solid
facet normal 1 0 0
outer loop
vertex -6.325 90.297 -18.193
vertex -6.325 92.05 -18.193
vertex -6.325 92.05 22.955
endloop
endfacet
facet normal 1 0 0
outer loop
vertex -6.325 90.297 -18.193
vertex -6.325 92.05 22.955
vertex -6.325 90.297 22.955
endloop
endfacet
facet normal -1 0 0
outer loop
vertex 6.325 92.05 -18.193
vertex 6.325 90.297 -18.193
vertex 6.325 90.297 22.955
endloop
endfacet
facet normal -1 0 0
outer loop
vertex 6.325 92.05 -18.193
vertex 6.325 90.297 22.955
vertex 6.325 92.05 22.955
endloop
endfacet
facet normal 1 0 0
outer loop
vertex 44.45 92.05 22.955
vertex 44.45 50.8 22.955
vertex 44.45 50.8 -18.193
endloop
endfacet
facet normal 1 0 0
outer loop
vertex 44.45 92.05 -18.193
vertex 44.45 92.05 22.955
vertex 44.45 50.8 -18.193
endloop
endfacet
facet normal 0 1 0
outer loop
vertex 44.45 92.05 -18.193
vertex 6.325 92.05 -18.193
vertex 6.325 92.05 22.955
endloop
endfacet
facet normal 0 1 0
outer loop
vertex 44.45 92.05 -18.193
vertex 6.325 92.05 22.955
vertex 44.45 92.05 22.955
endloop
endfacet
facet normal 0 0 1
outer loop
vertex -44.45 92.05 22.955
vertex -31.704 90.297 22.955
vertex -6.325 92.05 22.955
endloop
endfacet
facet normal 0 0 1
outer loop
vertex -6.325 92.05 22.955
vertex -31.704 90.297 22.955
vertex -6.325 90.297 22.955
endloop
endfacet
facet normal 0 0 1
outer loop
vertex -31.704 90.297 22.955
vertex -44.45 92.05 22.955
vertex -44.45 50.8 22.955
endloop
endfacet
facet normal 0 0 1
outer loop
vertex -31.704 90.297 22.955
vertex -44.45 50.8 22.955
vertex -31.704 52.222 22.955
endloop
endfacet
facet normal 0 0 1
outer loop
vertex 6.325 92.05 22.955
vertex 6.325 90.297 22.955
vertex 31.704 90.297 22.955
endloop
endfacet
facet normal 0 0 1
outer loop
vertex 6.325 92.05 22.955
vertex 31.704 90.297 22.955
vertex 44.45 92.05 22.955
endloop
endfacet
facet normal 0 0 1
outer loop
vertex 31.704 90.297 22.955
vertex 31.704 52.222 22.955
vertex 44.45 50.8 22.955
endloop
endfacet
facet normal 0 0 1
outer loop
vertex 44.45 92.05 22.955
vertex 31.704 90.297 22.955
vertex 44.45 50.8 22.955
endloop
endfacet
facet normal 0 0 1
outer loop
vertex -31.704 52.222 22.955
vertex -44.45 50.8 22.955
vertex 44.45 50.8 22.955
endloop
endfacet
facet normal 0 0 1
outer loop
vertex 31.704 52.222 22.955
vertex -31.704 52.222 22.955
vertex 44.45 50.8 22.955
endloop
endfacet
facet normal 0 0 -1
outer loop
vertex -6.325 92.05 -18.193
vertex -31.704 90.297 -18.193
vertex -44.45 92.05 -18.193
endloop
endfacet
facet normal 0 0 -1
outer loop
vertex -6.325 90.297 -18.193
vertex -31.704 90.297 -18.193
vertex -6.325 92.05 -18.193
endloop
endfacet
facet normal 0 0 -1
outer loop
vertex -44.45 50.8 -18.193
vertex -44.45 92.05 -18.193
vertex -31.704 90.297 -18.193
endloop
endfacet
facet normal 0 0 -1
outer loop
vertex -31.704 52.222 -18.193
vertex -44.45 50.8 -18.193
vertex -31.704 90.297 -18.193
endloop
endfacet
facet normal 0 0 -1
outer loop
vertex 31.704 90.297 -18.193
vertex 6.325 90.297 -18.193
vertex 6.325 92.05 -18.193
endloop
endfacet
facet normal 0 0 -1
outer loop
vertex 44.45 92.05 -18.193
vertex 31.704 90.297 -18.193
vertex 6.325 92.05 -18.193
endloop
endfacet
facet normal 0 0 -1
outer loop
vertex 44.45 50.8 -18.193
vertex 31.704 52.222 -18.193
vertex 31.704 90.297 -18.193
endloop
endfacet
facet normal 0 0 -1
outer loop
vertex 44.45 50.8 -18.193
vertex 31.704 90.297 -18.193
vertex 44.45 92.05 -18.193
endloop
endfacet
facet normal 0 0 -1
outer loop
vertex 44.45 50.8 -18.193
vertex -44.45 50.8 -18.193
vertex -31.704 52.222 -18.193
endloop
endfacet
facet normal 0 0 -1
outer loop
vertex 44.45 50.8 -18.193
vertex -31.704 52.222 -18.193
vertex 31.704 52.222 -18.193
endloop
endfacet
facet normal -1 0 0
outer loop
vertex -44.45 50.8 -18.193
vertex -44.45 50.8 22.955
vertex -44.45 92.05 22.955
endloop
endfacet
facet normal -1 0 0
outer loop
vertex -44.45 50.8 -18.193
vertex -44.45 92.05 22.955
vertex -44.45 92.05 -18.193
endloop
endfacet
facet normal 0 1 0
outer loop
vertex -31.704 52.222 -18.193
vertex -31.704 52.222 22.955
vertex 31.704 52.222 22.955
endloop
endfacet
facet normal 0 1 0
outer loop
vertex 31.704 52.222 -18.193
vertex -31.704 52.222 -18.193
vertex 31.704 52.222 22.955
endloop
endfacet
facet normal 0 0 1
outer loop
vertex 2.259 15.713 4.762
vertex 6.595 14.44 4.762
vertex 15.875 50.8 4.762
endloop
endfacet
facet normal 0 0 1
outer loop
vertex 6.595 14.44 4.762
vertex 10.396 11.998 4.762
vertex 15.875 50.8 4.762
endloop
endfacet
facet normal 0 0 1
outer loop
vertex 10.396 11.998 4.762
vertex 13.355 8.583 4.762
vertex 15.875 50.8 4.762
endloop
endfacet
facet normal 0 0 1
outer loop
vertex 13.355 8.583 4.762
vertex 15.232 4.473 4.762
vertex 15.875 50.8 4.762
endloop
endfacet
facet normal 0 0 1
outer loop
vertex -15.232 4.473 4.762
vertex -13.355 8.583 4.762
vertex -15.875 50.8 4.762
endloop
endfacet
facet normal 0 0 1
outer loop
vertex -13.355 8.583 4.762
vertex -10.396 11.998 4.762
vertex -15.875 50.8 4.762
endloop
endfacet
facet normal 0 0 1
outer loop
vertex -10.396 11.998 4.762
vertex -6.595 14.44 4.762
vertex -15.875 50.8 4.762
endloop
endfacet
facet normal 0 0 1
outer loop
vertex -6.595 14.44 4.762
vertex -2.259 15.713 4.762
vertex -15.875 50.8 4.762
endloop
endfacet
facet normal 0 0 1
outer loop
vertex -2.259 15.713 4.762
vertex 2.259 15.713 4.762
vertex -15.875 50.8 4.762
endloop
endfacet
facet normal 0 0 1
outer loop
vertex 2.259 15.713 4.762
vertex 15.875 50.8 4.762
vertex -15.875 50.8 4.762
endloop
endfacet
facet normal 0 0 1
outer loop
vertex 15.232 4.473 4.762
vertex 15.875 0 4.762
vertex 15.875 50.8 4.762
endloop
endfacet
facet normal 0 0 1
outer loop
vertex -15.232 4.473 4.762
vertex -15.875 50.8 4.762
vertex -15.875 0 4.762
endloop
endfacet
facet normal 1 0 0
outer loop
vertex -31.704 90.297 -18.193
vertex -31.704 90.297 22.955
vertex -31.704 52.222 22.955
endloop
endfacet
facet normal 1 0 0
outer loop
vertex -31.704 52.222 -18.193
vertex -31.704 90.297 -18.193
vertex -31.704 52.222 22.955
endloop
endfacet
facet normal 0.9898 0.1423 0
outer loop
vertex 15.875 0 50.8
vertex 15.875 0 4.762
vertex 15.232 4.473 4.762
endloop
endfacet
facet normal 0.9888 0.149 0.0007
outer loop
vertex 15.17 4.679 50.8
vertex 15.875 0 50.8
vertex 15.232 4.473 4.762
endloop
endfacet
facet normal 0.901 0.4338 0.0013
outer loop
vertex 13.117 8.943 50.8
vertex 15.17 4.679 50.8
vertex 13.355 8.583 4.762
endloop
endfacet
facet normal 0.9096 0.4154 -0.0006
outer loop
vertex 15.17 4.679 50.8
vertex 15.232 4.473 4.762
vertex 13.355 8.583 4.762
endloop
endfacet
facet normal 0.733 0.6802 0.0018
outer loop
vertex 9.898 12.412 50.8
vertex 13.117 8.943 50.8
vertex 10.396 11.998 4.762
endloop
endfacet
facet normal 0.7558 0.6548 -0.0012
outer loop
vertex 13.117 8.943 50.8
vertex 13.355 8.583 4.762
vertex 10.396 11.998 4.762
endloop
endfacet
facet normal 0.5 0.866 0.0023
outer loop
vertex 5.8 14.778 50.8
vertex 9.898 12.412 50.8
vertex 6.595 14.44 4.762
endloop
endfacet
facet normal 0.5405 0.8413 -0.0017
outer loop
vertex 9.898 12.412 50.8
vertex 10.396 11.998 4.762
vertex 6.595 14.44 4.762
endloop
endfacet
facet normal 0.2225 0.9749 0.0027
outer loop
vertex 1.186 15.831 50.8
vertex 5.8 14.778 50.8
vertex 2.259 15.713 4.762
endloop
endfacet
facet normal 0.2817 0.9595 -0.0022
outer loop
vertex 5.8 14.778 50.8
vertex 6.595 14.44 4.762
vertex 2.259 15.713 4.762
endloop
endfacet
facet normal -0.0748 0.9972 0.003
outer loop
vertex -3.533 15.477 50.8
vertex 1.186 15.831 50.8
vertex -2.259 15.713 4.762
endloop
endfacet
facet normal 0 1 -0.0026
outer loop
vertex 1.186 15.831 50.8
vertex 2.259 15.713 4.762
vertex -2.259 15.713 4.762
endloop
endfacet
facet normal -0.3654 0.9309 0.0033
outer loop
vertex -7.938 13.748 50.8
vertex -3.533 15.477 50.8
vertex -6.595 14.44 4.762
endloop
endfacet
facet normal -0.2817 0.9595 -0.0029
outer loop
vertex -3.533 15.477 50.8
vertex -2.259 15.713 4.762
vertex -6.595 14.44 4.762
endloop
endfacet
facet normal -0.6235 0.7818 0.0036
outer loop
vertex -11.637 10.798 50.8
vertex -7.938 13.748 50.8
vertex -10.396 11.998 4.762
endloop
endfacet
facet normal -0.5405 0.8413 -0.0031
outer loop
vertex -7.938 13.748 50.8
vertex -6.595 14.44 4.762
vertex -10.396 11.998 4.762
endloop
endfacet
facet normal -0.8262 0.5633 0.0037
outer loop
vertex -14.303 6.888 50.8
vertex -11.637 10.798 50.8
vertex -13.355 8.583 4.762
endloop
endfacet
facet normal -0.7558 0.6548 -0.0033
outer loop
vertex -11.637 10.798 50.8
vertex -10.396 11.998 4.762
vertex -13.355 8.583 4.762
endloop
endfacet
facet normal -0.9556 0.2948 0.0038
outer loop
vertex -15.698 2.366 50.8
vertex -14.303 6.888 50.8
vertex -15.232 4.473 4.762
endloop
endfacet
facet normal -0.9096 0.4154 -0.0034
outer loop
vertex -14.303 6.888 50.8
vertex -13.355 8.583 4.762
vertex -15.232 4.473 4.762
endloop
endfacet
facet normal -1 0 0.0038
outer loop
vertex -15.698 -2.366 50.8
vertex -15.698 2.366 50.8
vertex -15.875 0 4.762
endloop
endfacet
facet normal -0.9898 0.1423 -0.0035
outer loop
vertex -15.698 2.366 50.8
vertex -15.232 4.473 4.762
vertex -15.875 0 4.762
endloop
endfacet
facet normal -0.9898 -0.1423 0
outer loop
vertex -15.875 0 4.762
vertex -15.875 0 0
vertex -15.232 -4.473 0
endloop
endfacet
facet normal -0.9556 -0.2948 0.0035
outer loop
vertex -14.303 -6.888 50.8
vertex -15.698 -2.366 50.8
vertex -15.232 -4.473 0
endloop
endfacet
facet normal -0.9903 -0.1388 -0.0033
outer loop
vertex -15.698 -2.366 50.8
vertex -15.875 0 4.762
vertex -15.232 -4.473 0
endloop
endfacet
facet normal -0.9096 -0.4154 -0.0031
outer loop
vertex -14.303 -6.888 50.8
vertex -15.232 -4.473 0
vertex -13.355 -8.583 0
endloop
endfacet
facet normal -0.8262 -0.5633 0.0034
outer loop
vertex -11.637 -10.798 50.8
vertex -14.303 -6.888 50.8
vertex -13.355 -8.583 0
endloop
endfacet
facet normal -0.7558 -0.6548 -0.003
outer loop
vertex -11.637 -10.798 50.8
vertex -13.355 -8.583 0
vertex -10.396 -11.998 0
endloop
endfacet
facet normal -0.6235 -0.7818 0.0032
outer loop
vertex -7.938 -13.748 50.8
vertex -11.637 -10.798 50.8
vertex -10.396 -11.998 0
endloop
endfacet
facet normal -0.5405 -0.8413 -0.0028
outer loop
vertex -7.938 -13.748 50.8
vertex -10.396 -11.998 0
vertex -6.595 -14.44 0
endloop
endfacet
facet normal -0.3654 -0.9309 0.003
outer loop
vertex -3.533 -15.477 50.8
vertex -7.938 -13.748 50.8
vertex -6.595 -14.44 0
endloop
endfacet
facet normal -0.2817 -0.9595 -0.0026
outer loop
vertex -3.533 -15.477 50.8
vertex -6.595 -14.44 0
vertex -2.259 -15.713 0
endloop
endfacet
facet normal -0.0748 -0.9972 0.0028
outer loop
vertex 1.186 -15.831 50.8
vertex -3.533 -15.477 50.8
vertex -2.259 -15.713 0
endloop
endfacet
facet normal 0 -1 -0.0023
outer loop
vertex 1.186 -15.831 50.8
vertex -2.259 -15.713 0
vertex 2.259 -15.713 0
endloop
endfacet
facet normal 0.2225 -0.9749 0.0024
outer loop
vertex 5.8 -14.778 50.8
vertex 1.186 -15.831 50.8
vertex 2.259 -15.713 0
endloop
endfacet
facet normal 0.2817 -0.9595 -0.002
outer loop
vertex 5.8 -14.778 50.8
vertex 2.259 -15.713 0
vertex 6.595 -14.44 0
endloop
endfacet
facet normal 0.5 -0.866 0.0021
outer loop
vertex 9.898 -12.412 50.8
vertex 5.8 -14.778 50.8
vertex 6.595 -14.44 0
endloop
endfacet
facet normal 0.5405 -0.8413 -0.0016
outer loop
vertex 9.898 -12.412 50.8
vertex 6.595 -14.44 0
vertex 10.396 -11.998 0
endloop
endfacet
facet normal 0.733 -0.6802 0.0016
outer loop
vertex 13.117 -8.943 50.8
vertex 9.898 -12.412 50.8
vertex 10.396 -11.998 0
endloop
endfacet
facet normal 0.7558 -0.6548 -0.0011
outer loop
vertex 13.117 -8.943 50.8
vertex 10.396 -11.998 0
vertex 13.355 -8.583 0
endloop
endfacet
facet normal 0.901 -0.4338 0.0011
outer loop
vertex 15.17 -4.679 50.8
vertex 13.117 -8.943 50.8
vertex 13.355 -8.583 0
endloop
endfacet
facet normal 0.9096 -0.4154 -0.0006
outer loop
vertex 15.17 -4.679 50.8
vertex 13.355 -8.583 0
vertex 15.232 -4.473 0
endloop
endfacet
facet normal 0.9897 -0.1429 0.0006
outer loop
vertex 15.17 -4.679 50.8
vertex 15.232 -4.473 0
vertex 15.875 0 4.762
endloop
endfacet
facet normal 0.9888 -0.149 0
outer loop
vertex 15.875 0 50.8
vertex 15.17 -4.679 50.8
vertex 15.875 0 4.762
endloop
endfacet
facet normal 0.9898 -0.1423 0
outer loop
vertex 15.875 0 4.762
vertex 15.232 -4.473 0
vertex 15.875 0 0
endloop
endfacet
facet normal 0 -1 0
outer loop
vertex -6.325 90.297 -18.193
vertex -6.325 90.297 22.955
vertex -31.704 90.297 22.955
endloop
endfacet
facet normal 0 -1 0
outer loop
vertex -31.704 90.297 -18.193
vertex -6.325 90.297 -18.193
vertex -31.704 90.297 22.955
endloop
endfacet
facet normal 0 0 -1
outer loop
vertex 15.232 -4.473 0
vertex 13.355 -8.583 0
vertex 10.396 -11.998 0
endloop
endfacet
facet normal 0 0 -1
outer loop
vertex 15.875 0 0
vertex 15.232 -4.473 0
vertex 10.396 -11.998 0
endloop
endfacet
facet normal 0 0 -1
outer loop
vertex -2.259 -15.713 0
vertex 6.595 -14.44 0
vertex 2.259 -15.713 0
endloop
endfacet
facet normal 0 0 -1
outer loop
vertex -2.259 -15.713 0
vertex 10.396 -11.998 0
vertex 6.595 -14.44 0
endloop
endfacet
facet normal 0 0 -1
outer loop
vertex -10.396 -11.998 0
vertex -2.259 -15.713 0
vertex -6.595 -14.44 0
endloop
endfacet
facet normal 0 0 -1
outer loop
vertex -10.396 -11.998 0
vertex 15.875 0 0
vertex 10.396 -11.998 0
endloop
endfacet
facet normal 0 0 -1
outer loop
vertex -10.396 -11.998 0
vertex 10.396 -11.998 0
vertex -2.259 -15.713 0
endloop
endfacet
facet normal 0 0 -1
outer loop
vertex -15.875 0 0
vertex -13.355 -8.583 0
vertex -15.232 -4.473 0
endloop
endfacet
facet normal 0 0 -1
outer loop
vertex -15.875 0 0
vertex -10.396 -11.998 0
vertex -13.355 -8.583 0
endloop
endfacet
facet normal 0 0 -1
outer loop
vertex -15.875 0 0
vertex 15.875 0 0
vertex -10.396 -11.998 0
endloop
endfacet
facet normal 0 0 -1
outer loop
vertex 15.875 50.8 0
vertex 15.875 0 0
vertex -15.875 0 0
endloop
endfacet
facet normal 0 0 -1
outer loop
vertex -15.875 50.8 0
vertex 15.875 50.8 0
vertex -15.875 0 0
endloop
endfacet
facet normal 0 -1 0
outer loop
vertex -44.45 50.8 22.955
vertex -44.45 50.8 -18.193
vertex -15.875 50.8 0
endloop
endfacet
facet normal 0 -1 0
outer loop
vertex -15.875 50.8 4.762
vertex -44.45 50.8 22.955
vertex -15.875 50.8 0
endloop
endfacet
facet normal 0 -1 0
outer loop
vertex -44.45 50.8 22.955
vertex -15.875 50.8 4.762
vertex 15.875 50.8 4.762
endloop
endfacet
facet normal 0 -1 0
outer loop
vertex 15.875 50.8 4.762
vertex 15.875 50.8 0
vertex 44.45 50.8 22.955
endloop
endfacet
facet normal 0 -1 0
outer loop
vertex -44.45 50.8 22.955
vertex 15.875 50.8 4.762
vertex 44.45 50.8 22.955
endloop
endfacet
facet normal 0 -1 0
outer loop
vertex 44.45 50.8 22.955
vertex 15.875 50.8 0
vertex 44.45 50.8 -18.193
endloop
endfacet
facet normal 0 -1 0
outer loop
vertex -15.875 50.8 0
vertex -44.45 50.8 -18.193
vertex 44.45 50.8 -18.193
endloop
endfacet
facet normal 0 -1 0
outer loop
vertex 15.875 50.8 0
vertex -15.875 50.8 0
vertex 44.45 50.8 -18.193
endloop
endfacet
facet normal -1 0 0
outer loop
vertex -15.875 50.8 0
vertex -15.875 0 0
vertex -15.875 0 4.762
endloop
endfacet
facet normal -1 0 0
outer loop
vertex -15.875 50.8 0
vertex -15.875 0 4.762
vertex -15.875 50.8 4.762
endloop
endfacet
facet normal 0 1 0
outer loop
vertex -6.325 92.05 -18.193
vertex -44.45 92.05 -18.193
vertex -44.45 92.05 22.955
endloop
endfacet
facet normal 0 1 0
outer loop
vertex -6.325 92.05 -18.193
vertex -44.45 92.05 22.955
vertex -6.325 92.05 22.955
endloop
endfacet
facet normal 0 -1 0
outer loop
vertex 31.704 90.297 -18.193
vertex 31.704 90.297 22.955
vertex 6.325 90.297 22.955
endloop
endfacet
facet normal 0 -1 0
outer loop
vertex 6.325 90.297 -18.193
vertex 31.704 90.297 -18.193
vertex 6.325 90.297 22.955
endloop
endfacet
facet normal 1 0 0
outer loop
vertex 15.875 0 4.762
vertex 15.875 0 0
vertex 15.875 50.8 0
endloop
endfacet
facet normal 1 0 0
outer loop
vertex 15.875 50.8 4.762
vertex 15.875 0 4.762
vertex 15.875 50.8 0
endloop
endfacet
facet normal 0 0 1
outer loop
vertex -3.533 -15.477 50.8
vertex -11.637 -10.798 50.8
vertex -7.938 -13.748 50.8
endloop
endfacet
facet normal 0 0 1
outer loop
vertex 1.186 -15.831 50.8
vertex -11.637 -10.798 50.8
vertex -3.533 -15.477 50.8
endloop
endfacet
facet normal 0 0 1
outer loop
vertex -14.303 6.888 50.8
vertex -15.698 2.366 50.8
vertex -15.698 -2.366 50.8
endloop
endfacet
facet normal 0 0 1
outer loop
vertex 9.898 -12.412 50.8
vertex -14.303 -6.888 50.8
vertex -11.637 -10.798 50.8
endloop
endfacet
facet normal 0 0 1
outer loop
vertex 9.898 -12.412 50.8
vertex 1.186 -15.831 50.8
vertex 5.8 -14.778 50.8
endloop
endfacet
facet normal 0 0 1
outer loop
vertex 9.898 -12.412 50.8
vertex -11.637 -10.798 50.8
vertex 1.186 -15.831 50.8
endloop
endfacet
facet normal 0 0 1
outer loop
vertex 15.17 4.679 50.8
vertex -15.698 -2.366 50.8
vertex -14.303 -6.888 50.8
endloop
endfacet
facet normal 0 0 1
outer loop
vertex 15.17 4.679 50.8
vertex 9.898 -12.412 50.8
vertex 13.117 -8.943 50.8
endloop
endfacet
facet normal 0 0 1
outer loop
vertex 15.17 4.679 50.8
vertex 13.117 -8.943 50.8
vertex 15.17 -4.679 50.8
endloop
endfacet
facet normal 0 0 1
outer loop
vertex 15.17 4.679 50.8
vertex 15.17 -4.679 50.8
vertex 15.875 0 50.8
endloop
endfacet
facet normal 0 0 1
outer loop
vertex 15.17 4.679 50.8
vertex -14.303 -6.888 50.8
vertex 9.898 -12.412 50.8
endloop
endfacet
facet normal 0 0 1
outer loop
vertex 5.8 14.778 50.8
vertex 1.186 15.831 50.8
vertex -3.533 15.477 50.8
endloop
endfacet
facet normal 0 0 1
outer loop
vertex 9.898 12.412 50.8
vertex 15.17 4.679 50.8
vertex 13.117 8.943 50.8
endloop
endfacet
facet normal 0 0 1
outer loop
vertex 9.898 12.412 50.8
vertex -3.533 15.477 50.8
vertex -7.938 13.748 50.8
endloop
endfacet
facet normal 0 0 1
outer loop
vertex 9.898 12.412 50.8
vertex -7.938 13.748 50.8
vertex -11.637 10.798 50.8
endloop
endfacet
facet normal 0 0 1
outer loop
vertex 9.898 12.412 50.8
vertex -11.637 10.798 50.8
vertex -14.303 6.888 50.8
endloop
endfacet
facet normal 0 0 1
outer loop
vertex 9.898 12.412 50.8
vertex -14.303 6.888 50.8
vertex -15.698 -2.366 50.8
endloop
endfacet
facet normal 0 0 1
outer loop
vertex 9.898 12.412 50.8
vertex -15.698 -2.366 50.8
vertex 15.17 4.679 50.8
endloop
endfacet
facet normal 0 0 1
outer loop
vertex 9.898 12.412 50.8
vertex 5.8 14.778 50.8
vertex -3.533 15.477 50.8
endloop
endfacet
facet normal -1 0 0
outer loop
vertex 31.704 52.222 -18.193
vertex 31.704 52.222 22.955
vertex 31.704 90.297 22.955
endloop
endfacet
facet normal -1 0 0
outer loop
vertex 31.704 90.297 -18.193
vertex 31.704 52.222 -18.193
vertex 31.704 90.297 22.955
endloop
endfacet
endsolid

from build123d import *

# Parameters (mm, degrees)
SKETCH1_R           = 15.875
BOSS_EXTRUDE1_DEPTH = 50.8
SKETCH2_W           = 31.75
SKETCH2_H           = 50.8
BOSS_EXTRUDE2_DEPTH = 4.7625
SKETCH3_W           = 88.9
SKETCH3_H           = 41.148
BOSS_EXTRUDE3_DEPTH = 41.2496
CUT_EXTRUDE2_DEPTH  = 111.191148756


with BuildPart() as part:
    # Sketch1 → Boss-Extrude1 (new body)
    with BuildSketch(Plane.XY):
        Circle(SKETCH1_R)
    extrude(amount=BOSS_EXTRUDE1_DEPTH)

    # Sketch2 → Boss-Extrude2 (add)
    with BuildSketch(Plane(origin=(0, 0, 0), x_dir=(-1, 0, 0), z_dir=(0, 0, -1))):
        with Locations((0, 25.4)):
            Rectangle(SKETCH2_W, SKETCH2_H)
    extrude(amount=-BOSS_EXTRUDE2_DEPTH)

    # Sketch3 → Boss-Extrude3 (add)
    with BuildSketch(Plane(origin=(0, 50.8, 0), x_dir=(1, 0, 0), z_dir=(0, 1, 0))):
        with Locations((0, -2.38125)):
            Rectangle(SKETCH3_W, SKETCH3_H)
    extrude(amount=BOSS_EXTRUDE3_DEPTH)

    # Sketch5 → Cut-Extrude2 (cut, through all)
    with BuildSketch(Plane.XY.offset(22.95525)):
        Polygon((-6.3246, 92.0496), (-6.3246, 90.297), (-31.70428, 90.297), (-31.70428, 52.2224), (31.70428, 52.2224), (31.70428, 90.297), (6.3246, 90.297), (6.3246, 92.0496), align=None)
    extrude(amount=-CUT_EXTRUDE2_DEPTH, mode=Mode.SUBTRACT)


solid = part.part
